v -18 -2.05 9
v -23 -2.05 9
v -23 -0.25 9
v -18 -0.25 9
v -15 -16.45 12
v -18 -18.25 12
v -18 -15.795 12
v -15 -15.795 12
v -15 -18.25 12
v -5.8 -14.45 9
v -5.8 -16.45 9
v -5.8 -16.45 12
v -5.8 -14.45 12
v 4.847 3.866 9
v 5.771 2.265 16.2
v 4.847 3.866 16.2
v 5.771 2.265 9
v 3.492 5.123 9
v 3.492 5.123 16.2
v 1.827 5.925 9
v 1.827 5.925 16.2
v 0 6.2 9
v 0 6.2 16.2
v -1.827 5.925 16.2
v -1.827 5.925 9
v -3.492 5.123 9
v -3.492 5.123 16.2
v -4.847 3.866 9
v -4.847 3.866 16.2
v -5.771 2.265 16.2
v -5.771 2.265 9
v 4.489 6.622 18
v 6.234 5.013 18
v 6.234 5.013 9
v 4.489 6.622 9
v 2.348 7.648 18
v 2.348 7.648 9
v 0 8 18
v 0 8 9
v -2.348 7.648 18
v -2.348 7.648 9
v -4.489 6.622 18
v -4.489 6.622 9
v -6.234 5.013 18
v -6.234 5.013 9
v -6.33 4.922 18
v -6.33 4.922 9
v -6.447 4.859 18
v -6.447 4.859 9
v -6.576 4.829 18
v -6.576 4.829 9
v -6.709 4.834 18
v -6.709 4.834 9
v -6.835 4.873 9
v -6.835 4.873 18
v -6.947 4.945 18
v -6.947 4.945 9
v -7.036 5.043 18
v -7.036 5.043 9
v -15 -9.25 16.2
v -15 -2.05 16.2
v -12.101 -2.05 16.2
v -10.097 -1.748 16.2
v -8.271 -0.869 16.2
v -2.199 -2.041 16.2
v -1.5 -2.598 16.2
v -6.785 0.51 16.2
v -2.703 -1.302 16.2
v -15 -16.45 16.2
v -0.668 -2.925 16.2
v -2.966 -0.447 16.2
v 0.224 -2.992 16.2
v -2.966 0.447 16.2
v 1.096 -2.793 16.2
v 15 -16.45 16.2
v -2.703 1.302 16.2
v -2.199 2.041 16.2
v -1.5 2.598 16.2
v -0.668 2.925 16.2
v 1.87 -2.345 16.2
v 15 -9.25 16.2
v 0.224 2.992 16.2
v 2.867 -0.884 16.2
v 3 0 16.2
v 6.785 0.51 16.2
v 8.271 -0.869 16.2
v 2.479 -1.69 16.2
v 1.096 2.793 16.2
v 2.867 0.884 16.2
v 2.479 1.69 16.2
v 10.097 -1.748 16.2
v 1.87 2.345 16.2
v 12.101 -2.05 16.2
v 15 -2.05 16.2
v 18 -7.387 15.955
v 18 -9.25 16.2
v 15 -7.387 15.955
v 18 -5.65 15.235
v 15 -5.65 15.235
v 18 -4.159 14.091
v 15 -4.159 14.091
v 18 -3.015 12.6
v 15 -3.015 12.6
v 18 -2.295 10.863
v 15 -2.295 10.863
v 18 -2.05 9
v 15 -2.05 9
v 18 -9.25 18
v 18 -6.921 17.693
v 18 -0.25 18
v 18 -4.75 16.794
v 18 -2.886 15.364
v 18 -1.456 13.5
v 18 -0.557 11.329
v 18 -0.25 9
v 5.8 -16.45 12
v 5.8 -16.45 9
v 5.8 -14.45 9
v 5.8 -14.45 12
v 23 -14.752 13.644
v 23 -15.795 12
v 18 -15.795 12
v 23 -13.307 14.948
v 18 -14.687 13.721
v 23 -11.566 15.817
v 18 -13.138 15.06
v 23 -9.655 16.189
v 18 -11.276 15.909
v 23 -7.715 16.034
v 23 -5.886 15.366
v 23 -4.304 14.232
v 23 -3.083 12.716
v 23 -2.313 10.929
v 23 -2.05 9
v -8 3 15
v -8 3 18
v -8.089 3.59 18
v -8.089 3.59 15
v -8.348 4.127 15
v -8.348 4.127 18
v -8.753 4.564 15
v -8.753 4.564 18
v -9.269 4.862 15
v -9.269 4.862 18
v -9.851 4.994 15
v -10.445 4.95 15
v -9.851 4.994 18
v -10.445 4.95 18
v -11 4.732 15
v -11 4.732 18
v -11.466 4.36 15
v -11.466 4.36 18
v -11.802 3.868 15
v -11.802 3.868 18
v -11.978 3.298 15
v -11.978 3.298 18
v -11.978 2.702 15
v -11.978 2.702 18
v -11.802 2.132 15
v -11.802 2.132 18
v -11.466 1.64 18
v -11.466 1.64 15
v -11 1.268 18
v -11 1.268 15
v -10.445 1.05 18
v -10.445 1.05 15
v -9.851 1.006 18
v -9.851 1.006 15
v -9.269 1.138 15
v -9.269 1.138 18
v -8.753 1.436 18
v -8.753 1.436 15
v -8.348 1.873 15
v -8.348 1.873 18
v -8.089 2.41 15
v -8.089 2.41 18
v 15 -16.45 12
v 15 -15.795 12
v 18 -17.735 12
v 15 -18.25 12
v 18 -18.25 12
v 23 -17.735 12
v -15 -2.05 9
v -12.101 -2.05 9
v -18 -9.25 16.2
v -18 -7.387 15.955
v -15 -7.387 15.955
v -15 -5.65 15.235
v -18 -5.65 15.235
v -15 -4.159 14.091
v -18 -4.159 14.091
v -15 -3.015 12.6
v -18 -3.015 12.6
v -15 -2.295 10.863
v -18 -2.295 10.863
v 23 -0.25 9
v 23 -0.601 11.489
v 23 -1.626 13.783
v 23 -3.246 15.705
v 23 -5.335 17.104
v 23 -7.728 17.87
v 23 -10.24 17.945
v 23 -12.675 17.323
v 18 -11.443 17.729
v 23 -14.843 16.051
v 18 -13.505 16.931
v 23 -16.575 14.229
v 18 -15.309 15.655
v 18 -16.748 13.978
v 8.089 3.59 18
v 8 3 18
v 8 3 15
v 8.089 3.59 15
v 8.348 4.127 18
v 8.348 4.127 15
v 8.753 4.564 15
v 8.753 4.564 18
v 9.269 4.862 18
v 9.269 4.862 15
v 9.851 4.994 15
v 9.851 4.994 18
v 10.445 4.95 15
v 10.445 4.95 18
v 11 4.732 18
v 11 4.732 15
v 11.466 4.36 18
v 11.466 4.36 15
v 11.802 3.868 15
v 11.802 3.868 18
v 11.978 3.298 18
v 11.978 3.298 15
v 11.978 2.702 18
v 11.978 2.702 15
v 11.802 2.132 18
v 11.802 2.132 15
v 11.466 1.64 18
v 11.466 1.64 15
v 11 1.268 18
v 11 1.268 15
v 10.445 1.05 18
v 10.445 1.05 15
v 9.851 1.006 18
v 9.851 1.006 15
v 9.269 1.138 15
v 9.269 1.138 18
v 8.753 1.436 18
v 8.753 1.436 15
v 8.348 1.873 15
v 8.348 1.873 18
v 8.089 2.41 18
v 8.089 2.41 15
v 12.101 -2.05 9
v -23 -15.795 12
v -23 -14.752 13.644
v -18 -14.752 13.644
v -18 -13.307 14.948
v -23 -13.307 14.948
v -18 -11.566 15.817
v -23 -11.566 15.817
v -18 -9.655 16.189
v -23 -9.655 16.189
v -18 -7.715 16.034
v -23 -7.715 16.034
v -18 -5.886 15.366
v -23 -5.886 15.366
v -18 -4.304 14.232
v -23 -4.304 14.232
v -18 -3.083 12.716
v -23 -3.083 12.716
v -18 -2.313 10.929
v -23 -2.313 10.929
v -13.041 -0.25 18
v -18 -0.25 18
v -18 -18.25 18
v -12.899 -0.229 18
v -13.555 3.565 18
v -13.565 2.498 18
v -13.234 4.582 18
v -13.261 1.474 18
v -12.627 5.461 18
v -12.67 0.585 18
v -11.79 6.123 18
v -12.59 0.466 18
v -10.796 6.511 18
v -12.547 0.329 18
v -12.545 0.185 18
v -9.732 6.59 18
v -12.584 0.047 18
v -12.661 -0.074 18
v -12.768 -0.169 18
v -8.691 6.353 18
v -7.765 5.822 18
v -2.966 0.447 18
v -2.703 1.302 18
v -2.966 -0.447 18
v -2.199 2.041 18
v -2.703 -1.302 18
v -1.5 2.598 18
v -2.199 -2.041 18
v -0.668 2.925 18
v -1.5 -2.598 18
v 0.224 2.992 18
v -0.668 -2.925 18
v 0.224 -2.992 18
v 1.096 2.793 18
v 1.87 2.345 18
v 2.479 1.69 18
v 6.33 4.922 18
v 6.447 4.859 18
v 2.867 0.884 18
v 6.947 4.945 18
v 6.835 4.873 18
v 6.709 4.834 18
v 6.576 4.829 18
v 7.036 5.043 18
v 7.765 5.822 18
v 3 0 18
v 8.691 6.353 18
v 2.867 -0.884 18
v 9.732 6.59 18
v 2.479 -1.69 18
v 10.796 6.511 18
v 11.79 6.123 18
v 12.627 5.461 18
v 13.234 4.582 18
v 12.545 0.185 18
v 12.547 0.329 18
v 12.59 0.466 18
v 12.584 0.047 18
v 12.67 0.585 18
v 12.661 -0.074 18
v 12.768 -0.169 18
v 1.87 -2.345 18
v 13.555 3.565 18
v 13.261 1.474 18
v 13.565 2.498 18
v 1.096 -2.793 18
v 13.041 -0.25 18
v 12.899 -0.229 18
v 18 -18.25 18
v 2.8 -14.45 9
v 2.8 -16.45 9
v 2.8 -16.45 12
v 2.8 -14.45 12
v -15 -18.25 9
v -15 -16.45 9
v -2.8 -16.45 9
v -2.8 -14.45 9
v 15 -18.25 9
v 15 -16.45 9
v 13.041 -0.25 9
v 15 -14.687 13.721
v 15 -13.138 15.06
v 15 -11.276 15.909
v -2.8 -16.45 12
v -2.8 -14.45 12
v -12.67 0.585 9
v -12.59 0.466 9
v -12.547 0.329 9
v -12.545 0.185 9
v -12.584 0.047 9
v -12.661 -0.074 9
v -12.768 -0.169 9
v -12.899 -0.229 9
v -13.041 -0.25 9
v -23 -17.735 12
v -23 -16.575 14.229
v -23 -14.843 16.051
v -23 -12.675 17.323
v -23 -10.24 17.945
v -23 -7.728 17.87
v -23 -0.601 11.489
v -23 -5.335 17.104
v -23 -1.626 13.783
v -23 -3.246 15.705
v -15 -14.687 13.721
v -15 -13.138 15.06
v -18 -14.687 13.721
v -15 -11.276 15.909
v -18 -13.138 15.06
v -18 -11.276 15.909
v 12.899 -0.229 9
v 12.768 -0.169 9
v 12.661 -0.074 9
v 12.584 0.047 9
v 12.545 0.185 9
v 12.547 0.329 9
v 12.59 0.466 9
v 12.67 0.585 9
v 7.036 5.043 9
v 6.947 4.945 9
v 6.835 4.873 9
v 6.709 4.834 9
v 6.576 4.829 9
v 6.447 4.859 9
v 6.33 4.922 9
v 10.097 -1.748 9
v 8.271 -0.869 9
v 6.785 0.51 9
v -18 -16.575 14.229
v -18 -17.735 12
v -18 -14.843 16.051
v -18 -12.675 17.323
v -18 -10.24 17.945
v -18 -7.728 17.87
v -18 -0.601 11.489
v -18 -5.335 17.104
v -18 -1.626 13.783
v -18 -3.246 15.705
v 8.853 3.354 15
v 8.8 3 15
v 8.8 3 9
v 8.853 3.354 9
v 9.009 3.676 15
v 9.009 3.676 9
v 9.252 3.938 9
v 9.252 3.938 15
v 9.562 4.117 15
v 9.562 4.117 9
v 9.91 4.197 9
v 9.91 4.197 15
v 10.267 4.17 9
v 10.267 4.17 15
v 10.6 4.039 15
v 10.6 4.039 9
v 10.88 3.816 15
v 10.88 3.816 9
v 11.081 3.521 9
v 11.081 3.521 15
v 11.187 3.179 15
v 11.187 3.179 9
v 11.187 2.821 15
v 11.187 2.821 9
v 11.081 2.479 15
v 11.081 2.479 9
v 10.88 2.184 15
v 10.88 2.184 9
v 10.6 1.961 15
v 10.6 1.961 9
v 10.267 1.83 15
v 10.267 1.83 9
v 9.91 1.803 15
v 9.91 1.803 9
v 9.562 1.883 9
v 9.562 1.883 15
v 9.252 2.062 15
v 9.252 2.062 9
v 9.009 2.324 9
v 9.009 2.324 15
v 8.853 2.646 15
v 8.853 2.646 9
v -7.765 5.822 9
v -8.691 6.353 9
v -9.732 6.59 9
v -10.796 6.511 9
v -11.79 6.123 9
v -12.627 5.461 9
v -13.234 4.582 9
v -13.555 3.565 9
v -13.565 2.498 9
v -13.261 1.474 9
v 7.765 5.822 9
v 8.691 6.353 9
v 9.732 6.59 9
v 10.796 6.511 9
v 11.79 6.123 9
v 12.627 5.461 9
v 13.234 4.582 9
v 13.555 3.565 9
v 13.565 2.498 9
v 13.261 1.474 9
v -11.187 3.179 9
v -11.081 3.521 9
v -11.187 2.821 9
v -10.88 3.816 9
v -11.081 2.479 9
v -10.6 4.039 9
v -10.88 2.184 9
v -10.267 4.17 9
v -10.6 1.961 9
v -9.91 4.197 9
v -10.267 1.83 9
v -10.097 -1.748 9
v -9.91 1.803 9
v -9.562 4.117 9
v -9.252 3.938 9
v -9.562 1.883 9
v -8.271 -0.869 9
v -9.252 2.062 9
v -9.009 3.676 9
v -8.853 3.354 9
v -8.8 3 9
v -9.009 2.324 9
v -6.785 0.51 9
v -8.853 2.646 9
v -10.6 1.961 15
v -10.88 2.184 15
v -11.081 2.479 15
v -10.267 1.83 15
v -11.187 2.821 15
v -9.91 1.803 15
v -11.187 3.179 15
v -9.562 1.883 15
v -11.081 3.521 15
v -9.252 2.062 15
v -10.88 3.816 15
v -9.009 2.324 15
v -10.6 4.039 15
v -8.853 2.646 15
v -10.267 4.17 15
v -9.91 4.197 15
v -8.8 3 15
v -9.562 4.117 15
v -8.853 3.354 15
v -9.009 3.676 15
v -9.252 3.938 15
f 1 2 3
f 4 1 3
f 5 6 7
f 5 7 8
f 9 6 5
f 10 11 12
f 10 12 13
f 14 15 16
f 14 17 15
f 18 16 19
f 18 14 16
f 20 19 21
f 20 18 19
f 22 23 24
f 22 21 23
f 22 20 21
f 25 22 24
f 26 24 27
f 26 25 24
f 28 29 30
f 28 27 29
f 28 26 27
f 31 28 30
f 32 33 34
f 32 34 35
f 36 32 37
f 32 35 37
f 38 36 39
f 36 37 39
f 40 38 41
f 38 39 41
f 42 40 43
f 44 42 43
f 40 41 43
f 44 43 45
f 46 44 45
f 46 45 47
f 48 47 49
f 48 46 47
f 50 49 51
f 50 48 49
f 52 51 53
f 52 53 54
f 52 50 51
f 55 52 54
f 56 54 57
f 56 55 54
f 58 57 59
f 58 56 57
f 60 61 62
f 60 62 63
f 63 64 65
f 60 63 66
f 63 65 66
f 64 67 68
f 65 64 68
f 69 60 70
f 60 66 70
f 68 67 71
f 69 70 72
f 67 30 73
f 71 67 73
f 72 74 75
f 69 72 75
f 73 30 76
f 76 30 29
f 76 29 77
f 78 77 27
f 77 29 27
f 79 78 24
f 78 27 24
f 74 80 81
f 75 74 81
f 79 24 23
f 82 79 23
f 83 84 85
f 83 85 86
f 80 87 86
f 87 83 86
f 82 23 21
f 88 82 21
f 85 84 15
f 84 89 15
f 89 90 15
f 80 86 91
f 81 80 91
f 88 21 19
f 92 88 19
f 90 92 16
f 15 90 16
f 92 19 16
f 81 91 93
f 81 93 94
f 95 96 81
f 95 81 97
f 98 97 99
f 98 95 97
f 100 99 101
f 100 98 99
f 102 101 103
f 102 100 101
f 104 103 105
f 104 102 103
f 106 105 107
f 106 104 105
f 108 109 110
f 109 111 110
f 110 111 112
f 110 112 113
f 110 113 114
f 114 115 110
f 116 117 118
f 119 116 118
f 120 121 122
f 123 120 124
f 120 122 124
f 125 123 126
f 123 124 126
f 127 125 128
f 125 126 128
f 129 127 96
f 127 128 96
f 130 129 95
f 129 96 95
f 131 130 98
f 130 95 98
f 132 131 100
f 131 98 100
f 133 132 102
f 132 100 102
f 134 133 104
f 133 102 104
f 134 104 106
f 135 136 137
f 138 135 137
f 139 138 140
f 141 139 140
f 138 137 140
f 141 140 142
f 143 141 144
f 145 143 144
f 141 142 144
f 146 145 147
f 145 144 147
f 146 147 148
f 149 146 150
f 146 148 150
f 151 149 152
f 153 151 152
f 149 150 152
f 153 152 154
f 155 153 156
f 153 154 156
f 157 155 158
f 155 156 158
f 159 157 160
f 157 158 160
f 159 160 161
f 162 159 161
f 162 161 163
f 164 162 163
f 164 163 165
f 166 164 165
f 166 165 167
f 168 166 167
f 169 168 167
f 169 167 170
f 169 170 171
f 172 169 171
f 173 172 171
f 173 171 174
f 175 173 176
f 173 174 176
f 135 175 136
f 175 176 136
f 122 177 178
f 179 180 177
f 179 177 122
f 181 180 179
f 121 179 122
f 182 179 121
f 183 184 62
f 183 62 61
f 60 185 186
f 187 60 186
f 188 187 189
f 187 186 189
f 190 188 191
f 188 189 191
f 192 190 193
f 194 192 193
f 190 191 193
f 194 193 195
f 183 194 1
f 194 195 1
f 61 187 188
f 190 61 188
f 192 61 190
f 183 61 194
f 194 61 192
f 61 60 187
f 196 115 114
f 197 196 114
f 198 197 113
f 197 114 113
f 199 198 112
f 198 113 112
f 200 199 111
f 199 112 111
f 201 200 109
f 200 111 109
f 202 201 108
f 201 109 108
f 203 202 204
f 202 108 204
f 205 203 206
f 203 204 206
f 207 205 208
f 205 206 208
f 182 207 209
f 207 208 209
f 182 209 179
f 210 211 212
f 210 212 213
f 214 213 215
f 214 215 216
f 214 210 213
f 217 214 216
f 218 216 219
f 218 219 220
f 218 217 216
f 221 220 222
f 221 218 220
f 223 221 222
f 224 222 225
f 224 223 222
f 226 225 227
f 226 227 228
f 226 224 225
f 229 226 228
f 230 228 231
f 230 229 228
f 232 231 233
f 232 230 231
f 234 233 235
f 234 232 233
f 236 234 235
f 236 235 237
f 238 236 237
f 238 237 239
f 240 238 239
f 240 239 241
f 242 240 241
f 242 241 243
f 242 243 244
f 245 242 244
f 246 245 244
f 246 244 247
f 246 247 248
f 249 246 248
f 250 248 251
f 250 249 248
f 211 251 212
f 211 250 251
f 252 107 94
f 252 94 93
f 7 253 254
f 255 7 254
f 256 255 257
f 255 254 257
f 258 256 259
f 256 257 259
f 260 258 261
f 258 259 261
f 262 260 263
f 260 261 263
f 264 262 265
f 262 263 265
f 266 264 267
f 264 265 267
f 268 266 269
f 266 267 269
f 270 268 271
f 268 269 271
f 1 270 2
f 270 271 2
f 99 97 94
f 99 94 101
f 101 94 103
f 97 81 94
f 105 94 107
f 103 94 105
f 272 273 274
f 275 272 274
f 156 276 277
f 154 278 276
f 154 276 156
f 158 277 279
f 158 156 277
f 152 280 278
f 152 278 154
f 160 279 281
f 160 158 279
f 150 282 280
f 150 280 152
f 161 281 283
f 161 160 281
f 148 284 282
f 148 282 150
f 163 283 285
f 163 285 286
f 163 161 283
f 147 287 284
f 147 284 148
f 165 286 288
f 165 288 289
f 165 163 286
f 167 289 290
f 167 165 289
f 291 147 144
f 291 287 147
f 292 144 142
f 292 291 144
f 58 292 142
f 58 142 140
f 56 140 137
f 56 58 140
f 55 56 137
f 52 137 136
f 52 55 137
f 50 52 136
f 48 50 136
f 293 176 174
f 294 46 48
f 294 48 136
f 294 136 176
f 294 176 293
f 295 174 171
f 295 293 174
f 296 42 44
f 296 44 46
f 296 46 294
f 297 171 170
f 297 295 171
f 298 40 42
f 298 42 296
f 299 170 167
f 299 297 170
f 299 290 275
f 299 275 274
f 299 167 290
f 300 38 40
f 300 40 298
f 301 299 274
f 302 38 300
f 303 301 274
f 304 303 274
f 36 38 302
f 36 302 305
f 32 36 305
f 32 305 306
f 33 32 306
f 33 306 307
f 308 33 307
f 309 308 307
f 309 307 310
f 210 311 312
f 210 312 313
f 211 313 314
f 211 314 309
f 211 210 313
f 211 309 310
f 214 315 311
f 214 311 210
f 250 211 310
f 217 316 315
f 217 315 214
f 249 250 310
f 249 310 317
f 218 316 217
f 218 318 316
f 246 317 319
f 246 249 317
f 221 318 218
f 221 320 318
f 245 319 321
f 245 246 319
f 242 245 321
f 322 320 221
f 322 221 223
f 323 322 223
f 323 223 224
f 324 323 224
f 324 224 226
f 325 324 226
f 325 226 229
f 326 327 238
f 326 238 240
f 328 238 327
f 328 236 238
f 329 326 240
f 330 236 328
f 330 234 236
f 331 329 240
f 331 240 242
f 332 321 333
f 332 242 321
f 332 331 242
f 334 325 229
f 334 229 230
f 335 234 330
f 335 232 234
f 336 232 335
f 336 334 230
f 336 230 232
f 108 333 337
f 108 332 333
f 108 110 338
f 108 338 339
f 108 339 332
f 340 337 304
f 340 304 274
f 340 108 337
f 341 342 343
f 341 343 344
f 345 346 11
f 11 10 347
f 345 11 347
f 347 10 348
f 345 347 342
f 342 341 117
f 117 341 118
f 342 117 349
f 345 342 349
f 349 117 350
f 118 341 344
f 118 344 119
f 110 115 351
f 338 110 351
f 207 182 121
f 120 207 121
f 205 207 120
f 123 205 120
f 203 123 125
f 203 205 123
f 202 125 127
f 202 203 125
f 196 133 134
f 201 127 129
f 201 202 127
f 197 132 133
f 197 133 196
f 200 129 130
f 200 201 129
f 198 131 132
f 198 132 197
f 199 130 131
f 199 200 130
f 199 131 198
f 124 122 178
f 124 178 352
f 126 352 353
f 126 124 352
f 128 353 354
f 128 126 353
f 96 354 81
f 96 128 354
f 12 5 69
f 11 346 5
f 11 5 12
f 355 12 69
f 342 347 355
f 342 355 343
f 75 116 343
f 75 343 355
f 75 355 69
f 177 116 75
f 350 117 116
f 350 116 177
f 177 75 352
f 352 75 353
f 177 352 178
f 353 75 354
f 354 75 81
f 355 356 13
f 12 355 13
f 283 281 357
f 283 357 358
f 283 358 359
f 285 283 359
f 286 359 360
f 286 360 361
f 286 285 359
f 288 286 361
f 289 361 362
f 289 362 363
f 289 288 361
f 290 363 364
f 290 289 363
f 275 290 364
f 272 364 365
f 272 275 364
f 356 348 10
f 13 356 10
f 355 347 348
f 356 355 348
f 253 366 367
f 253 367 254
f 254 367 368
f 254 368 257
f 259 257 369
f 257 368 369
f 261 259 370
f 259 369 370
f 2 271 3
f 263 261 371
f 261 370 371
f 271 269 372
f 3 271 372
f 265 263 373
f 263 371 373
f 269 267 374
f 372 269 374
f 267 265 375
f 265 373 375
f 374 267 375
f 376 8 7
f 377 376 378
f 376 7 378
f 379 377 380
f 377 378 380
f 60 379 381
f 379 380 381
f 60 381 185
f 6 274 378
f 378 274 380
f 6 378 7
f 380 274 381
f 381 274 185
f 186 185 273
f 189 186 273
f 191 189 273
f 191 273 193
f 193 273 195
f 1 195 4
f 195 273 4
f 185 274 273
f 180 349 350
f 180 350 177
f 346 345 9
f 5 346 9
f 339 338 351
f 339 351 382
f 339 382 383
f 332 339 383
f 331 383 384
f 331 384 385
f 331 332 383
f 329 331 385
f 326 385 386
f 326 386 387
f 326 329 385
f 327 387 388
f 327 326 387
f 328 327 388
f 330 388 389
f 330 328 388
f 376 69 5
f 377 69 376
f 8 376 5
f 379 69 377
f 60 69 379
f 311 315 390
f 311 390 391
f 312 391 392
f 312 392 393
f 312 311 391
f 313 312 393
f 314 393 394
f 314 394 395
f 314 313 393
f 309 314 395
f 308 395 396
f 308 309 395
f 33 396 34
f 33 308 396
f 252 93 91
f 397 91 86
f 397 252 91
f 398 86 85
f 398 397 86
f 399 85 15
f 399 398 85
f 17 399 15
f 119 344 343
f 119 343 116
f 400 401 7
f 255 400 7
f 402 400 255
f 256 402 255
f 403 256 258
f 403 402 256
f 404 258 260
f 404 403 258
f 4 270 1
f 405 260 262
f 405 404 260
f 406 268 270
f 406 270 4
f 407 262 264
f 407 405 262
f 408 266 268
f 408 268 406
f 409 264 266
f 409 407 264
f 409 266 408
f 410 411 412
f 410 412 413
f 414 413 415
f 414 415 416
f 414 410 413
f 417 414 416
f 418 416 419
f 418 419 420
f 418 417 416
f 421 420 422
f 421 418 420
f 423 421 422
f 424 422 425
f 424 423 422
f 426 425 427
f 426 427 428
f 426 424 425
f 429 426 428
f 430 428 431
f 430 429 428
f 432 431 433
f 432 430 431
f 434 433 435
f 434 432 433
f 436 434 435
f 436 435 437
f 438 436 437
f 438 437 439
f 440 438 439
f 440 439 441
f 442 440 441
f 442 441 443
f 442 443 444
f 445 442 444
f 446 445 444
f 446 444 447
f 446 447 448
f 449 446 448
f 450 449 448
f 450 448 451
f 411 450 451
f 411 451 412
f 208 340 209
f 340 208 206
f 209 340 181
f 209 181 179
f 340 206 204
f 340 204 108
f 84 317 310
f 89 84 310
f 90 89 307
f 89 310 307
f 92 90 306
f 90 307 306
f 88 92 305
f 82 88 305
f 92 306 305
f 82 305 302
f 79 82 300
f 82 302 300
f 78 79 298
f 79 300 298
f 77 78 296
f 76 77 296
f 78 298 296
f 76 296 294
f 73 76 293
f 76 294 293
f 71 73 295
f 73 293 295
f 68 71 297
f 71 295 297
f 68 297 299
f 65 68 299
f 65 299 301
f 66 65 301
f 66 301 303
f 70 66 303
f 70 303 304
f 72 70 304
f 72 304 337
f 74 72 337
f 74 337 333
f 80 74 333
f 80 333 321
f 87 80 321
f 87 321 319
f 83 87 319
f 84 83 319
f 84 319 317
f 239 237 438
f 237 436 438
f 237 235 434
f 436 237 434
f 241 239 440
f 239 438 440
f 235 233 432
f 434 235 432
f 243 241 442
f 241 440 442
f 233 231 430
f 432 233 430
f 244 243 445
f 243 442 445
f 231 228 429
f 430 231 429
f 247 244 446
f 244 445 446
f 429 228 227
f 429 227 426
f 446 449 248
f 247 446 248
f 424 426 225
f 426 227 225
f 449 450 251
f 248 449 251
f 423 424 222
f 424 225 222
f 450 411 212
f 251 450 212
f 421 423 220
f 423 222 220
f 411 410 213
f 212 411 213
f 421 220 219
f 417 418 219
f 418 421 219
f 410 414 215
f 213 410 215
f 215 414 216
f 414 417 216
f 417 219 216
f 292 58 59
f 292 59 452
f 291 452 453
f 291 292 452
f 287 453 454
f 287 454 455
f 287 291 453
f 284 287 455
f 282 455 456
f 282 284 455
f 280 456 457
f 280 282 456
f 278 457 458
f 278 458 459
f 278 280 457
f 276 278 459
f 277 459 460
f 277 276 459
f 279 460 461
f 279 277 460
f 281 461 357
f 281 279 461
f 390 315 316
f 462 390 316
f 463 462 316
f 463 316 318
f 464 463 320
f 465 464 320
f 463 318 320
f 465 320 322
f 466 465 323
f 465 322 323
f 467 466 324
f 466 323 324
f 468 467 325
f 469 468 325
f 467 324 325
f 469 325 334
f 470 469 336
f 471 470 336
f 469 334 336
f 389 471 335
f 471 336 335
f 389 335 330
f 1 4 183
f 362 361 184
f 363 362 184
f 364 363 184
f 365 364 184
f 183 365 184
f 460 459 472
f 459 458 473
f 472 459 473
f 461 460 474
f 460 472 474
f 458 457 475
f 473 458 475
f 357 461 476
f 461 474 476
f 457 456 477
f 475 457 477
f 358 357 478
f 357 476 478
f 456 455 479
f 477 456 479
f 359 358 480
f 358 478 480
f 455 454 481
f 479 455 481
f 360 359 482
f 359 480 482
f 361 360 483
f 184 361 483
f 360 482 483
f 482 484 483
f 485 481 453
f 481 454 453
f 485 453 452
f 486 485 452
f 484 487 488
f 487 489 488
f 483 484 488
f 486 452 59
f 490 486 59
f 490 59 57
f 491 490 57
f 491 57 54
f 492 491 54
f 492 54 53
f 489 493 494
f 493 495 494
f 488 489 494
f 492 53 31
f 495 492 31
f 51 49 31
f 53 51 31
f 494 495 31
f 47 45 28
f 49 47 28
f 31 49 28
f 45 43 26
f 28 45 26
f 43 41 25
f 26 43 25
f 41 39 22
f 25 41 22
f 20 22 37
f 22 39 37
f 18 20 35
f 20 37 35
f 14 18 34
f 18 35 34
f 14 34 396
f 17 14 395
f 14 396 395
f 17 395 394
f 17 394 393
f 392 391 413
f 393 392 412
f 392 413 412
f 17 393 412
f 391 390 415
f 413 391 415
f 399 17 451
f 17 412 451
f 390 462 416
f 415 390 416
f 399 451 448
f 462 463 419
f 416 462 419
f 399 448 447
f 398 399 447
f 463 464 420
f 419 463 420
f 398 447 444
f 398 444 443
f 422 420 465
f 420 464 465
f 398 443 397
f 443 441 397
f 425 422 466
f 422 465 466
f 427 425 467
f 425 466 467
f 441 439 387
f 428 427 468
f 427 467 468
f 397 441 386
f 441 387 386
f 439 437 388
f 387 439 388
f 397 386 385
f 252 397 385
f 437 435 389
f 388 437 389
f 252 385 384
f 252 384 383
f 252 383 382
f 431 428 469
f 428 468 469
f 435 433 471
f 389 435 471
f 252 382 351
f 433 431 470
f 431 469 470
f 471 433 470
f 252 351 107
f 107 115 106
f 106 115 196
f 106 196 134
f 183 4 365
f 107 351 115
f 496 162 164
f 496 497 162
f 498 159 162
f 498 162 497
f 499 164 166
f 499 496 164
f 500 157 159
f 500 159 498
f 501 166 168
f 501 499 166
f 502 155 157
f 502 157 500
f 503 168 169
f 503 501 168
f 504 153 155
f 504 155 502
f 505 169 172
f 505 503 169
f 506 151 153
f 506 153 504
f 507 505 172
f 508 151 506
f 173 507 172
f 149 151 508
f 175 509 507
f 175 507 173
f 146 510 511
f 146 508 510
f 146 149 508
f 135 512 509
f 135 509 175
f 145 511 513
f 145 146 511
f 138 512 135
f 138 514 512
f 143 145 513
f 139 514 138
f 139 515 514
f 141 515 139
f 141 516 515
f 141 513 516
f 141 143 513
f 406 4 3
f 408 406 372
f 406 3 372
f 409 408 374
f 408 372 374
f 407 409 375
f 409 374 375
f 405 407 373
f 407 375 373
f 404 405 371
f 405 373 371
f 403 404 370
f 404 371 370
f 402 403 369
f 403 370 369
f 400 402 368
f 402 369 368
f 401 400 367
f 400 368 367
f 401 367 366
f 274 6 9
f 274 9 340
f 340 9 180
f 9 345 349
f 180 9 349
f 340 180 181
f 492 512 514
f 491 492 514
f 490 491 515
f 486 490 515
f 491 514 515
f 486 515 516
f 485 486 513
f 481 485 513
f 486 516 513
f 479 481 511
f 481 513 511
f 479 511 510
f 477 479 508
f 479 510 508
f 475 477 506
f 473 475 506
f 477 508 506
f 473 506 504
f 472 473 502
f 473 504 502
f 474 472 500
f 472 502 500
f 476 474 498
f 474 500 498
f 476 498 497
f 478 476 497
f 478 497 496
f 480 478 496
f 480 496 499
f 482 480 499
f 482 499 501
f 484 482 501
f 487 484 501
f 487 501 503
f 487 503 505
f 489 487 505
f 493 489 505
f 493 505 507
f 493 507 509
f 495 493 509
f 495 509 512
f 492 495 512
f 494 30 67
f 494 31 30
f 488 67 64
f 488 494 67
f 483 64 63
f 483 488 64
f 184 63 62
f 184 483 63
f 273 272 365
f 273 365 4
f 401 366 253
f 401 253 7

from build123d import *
from build123d.topology import SkipClean

# Parameters (mm, degrees)
BOSS_EXTRUDE1_DEPTH = 18
SKETCH4_R           = 9
SKETCH4_R_2         = 7.2
BOSS_EXTRUDE2_DEPTH = 5
SPLIT2_START        = -23
SPLIT2_DEPTH        = 5
SPLIT2_START_2      = 18
SPLIT2_2_DEPTH      = 5
SPLIT2_3_DEPTH      = 5
SPLIT2_4_DEPTH      = 5
SHELL1_T            = -1.8
BOSS_EXTRUDE6_DEPTH = 3
SKETCH10_W          = 8
SKETCH10_H          = 3
CUT_EXTRUDE2_DEPTH  = 5
SKETCH11_W          = 3
SKETCH11_H          = 2
BOSS_EXTRUDE5_DEPTH = 3
SKETCH12_R          = 3
CUT_EXTRUDE3_DEPTH  = 10
SKETCH14_R          = 3.6
SKETCH14_R_2        = 1.2
BOSS_EXTRUDE7_DEPTH = 9
SKETCH14_3_R        = 2
SKETCH14_3_R_2      = 1.2
CUT_EXTRUDE4_DEPTH  = 3
FILLET1_R           = 0.5


# Read off the part's stored shape, not the designer's step: Split2
with BuildPart() as part:
    # Sketch1 → Boss-Extrude1 (new body)
    with BuildSketch(Plane.XY):
        with BuildLine():
            Line((-18, -18.25), (18, -18.25))
            Line((18, -18.25), (18, -0.25))
            Line((18, -0.25), (12.10113631, -0.25))
            Line((12.10113631, -0.25), (7.996092796, -0.25))
            ThreePointArc((7.996092796, -0.25), (0, -8), (-7.996092796, -0.25))
            Line((-7.996092796, -0.25), (-12.10113631, -0.25))
            Line((-12.10113631, -0.25), (-18, -0.25))
            Line((-18, -0.25), (-18, -18.25))
        make_face()
        with BuildLine():
            ThreePointArc((-7.996092796, -0.25), (0, -8), (7.996092796, -0.25))
            Line((7.996092796, -0.25), (-7.996092796, -0.25))
        make_face()
        with BuildLine():
            Line((-7.996092796, -0.25), (7.996092796, -0.25))
            ThreePointArc((7.996092796, -0.25), (7.999023139, -0.125015265), (8, 0))
            ThreePointArc((8, 0), (7.86049696, 1.487476905), (7.446853114, 2.923076923))
            ThreePointArc((7.446853114, 2.923076923), (0, 8), (-7.446853114, 2.923076923))
            ThreePointArc((-7.446853114, 2.923076923), (-7.882781799, 1.364460009), (-7.996092796, -0.25))
        make_face()
        with BuildLine():
            Line((7.996092796, -0.25), (12.10113631, -0.25))
            ThreePointArc((12.10113631, -0.25), (9.28463275, 0.618740181), (7.446853114, 2.923076923))
            ThreePointArc((7.446853114, 2.923076923), (7.86049696, 1.487476905), (8, 0))
            ThreePointArc((8, 0), (7.999023139, -0.125015265), (7.996092796, -0.25))
        make_face()
        with BuildLine():
            ThreePointArc((-7.446853114, 2.923076923), (-9.28463275, 0.618740181), (-12.10113631, -0.25))
            Line((-12.10113631, -0.25), (-7.996092796, -0.25))
            ThreePointArc((-7.996092796, -0.25), (-7.882781799, 1.364460009), (-7.446853114, 2.923076923))
        make_face()
    extrude(amount=BOSS_EXTRUDE1_DEPTH)

    # Sketch4 → Boss-Extrude2 (add)
    with BuildSketch(Plane(origin=(18, 0, 0), x_dir=(0, 0, -1), z_dir=(1, 0, 0))):
        with Locations((-9, -9.25)):
            Circle(SKETCH4_R)
        with Locations((-9, -9.25)):
            Circle(SKETCH4_R_2, mode=Mode.SUBTRACT)
    boss_extrude2 = extrude(amount=BOSS_EXTRUDE2_DEPTH)

    # Mirror1: Boss-Extrude2 across plane
    add(boss_extrude2.mirror(Plane(origin=(0, 0, 0), x_dir=(0, 0, 1), z_dir=(1, 0, 0))))


with BuildPart() as body_2:
    # Split1: the piece on the far side of the plane
    add(part.part)
    split(bisect_by=Plane.XY.offset(9), keep=Keep.BOTTOM)


with BuildPart() as part_1:
    add(part.part)

    # Split1
    split(bisect_by=Plane.XY.offset(9), keep=Keep.TOP)

    # Split2 3 outline → Split2 3 (cut)
    with BuildSketch(Plane.YZ.offset(SPLIT2_START)):
        with BuildLine():
            Line((-18.25, 9), (-16.45, 9))
            ThreePointArc((-16.45, 9), (-9.25, 16.2), (-2.05, 9))
            Line((-2.05, 9), (-0.25, 9))
            ThreePointArc((-0.25, 9), (-9.25, 18), (-18.25, 9))
        make_face()
    extrude(amount=SPLIT2_3_DEPTH, mode=Mode.SUBTRACT)

    # Split2 4 outline → Split2 4 (cut)
    with BuildSketch(Plane.YZ.offset(SPLIT2_START_2)):
        with BuildLine():
            Line((-18.25, 9), (-16.45, 9))
            ThreePointArc((-16.45, 9), (-9.25, 16.2), (-2.05, 9))
            Line((-2.05, 9), (-0.25, 9))
            ThreePointArc((-0.25, 9), (-9.25, 18), (-18.25, 9))
        make_face()
    extrude(amount=SPLIT2_4_DEPTH, mode=Mode.SUBTRACT)

    # Shell1
    shell1_openings = [part_1.faces().sort_by_distance(p)[0] for p in [
        (18, -9.25, 13.5),
        (-18, -9.25, 13.5),
        (0, -7.45255142, 9),
    ]]
    offset(amount=SHELL1_T, openings=shell1_openings, kind=Kind.INTERSECTION)



with BuildPart() as body_2_2:
    # Split2 outline → Split2 (new body)
    with BuildSketch(Plane.YZ.offset(SPLIT2_START)):
        with BuildLine():
            Line((-2.05, 9), (-0.25, 9))
            ThreePointArc((-0.25, 9), (-9.25, 18), (-18.25, 9))
            Line((-18.25, 9), (-16.45, 9))
            ThreePointArc((-16.45, 9), (-9.25, 16.2), (-2.05, 9))
        make_face()
    extrude(amount=SPLIT2_DEPTH)


with BuildPart() as body_3:
    # Split2 2 outline → Split2 2 (new body)
    with BuildSketch(Plane.YZ.offset(SPLIT2_START_2)):
        with BuildLine():
            Line((-18.25, 9), (-16.45, 9))
            ThreePointArc((-16.45, 9), (-9.25, 16.2), (-2.05, 9))
            Line((-2.05, 9), (-0.25, 9))
            ThreePointArc((-0.25, 9), (-9.25, 18), (-18.25, 9))
        make_face()
    extrude(amount=SPLIT2_2_DEPTH)


with BuildPart() as part_2:
    with SkipClean():  # the faces are left unmerged after this step: merging them gives an invalid solid
        add(part_1.part)

        add(body_3.part)  # Boss-Extrude6 merges body 3
        # Sketch13 → Boss-Extrude6 (add)
        with BuildSketch(Plane(origin=(18, 0, 0), x_dir=(0, 0, -1), z_dir=(1, 0, 0))):
            with BuildLine():
                ThreePointArc((-16.2, -3.85), (-15.363961031, -2.886038969), (-14.4, -2.05))
                Line((-14.4, -2.05), (-16.2, -2.05))
                Line((-16.2, -2.05), (-16.2, -3.85))
            make_face()
            with BuildLine():
                ThreePointArc((-16.2, -9.25), (-14.091168825, -4.158831175), (-9, -2.05))
                Line((-9, -2.05), (-14.4, -2.05))
                ThreePointArc((-14.4, -2.05), (-15.363961031, -2.886038969), (-16.2, -3.85))
                Line((-16.2, -3.85), (-16.2, -9.25))
            make_face()
            with BuildLine():
                Line((-14.4, -16.45), (-9, -16.45))
                ThreePointArc((-9, -16.45), (-14.091168825, -14.341168825), (-16.2, -9.25))
                Line((-16.2, -9.25), (-16.2, -14.65))
                ThreePointArc((-16.2, -14.65), (-15.363961031, -15.613961031), (-14.4, -16.45))
            make_face()
            with BuildLine():
                ThreePointArc((-14.4, -16.45), (-15.363961031, -15.613961031), (-16.2, -14.65))
                Line((-16.2, -14.65), (-16.2, -16.45))
                Line((-16.2, -16.45), (-14.4, -16.45))
            make_face()
        boss_extrude6 = extrude(amount=-BOSS_EXTRUDE6_DEPTH)

    # Mirror2: Boss-Extrude6 across plane
    with SkipClean():  # the faces are left unmerged after this step: merging them gives an invalid solid
        add(boss_extrude6.mirror(Plane(origin=(0, 0, 0), x_dir=(0, 0, 1), z_dir=(1, 0, 0))))


with BuildPart() as cut_extrude2_tool:
    # Sketch10 → Cut-Extrude2 (new body)
    with SkipClean():  # the faces are left unmerged after this step: merging them gives an invalid solid
        with BuildSketch(Plane.XZ.offset(18.25)):
            with Locations((-19, 10.5)):
                Rectangle(SKETCH10_W, SKETCH10_H)
            with Locations((19, 10.5)):
                Rectangle(SKETCH10_W, SKETCH10_H)
        extrude(amount=-CUT_EXTRUDE2_DEPTH)


with BuildPart() as part_3:
    with SkipClean():  # the faces are left unmerged after this step: merging them gives an invalid solid
        add(part_2.part)

        # Cut-Extrude2: cut by cut_extrude2_tool
        add(cut_extrude2_tool.part, mode=Mode.SUBTRACT)

    # Sketch11 → Boss-Extrude5 (add)
    with SkipClean():  # the faces are left unmerged after this step: merging them gives an invalid solid
        with BuildSketch(Plane(origin=(0, 0, 9), x_dir=(-1, 0, 0), z_dir=(0, 0, -1))):
            with Locations((4.3, -15.45)):
                Rectangle(SKETCH11_W, SKETCH11_H)
        boss_extrude5 = extrude(amount=-BOSS_EXTRUDE5_DEPTH)

    # Mirror8: Boss-Extrude5 across plane
    with SkipClean():  # the faces are left unmerged after this step: merging them gives an invalid solid
        add(boss_extrude5.mirror(Plane(origin=(0, 0, 0), x_dir=(0, 0, 1), z_dir=(1, 0, 0))))

    # Sketch12 → Cut-Extrude3 (cut)
    # profile 1 of 2: a face of its own
    with SkipClean():  # the faces are left unmerged after this step: merging them gives an invalid solid
        with BuildSketch(Plane.XY.offset(18)):
            Circle(SKETCH12_R)
            Polygon((2, 0), (1, 1.732050808), (-1, 1.732050808), (-2, 0), (-1, -1.732050808), (1, -1.732050808), align=None, mode=Mode.SUBTRACT)
        # profile 2 of 2: a face of its own
        with BuildSketch(Plane.XY.offset(18)):
            Polygon((1, -1.732050808), (2, 0), (1, 1.732050808), (-1, 1.732050808), (-2, 0), (-1, -1.732050808), align=None)
        extrude(amount=-CUT_EXTRUDE3_DEPTH, mode=Mode.SUBTRACT)

    # Sketch14 → Boss-Extrude7 (add)
    with SkipClean():  # the faces are left unmerged after this step: merging them gives an invalid solid
        with BuildSketch(Plane.XY.offset(18)):
            with Locations((-10, 3)):
                Circle(SKETCH14_R)
            with Locations((-10, 3)):
                Circle(SKETCH14_R_2, mode=Mode.SUBTRACT)
        boss_extrude7 = extrude(amount=-BOSS_EXTRUDE7_DEPTH)

    # Sketch14<3> → Cut-Extrude4 (cut)
    with SkipClean():  # the faces are left unmerged after this step: merging them gives an invalid solid
        with BuildSketch(Plane.XY.offset(18)):
            with Locations((-10, 3)):
                Circle(SKETCH14_3_R)
            with Locations((-10, 3)):
                Circle(SKETCH14_3_R_2, mode=Mode.SUBTRACT)
        cut_extrude4 = extrude(amount=-CUT_EXTRUDE4_DEPTH, mode=Mode.SUBTRACT)

    # Mirror9: Boss-Extrude7, Cut-Extrude4 across plane
    with SkipClean():  # the faces are left unmerged after this step: merging them gives an invalid solid
        add(boss_extrude7.mirror(Plane(origin=(0, 0, 0), x_dir=(0, 0, 1), z_dir=(1, 0, 0))))
        add(cut_extrude4.mirror(Plane(origin=(0, 0, 0), x_dir=(0, 0, 1), z_dir=(1, 0, 0))), mode=Mode.SUBTRACT)

    # Fillet1
    # the kernel refuses this fillet: 0.5 mm, written as the material it adds along each edge
    with BuildSketch(Plane(origin=(-11.600134445, -0.224836392, 18), x_dir=(-0.9998475289118255, -0.017461927983941913, 0), z_dir=(0, 0, -1))) as fillet1_piece_1:
        with BuildLine():
            CenterArc((1.43232455, 0.499923764), FILLET1_R, 138.876982159, 132.123563468)
            Line((1.05567493, 0.828762728), (1.018009968, 0.861646624))
            ThreePointArc((1.018009968, 0.861646624), (0.535925496, 0.40407886), (-0.02300281, 0.04439449))
            Line((-0.02300281, 0.04439449), (-0.004140552, -0.049828263))
            ThreePointArc((-0.004140552, -0.049828263), (0.502237978, -0.066403689), (1.441928611, -0.049992376))
            Line((1.441928611, -0.049992376), (1.441055514, 0))
        make_face()
    extrude(amount=9)
    with BuildSketch(Plane(origin=(-6.682571593, 4.398094691, 18), x_dir=(0.5888742220615208, 0.8082246906593726, 0), z_dir=(0, 0, -1))) as fillet1_piece_2:
        with BuildLine():
            CenterArc((0.784874944, -0.499433997), FILLET1_R, 92.72648474, 106.623608355)
            ThreePointArc((0.313119131, -0.665103707), (0.173580894, -0.324538512), (0, 0))
            ThreePointArc((0, 0), (0.380545427, -0.009056052), (0.761090855, 0))
        make_face()
    extrude(amount=9)
    with BuildSketch(Plane(origin=(11.600134445, -0.224836392, 18), x_dir=(0.9998475289118255, -0.01746192798394126, 0), z_dir=(0, 0, -1))) as fillet1_piece_3:
        with BuildLine():
            CenterArc((1.43232455, -0.499923764), FILLET1_R, 88.999454372, 132.123563468)
            Line((1.05567493, -0.828762728), (1.018009968, -0.861646624))
            ThreePointArc((1.018009968, -0.861646624), (0.535925496, -0.40407886), (-0.02300281, -0.04439449))
            Line((-0.02300281, -0.04439449), (-0.004140552, 0.049828263))
            ThreePointArc((-0.004140552, 0.049828263), (0.502237978, 0.066403689), (1.441928611, 0.049992376))
            Line((1.441928611, 0.049992376), (1.441055514, 0))
        make_face()
    extrude(amount=9)
    with BuildSketch(Plane(origin=(6.682571593, 4.39809469, 18), x_dir=(-0.5888742220569161, 0.8082246906627277, 0), z_dir=(0, 0, -1))) as fillet1_piece_4:
        with BuildLine():
            CenterArc((0.784874944, 0.499433997), FILLET1_R, 160.649906904, 106.623608356)
            ThreePointArc((0.313119131, 0.665103707), (0.173580894, 0.324538512), (0, 0))
            ThreePointArc((0, 0), (0.380545427, 0.009056052), (0.761090855, 0))
        make_face()
    extrude(amount=9)


with BuildPart() as body_2_2_1:
    with SkipClean():  # the faces are left unmerged after this step: merging them gives an invalid solid
        add(body_2_2.part)

        # Cut-Extrude2: cut by cut_extrude2_tool
        add(cut_extrude2_tool.part, mode=Mode.SUBTRACT)


solid = Compound([part_3.part, body_2_2_1.part])
